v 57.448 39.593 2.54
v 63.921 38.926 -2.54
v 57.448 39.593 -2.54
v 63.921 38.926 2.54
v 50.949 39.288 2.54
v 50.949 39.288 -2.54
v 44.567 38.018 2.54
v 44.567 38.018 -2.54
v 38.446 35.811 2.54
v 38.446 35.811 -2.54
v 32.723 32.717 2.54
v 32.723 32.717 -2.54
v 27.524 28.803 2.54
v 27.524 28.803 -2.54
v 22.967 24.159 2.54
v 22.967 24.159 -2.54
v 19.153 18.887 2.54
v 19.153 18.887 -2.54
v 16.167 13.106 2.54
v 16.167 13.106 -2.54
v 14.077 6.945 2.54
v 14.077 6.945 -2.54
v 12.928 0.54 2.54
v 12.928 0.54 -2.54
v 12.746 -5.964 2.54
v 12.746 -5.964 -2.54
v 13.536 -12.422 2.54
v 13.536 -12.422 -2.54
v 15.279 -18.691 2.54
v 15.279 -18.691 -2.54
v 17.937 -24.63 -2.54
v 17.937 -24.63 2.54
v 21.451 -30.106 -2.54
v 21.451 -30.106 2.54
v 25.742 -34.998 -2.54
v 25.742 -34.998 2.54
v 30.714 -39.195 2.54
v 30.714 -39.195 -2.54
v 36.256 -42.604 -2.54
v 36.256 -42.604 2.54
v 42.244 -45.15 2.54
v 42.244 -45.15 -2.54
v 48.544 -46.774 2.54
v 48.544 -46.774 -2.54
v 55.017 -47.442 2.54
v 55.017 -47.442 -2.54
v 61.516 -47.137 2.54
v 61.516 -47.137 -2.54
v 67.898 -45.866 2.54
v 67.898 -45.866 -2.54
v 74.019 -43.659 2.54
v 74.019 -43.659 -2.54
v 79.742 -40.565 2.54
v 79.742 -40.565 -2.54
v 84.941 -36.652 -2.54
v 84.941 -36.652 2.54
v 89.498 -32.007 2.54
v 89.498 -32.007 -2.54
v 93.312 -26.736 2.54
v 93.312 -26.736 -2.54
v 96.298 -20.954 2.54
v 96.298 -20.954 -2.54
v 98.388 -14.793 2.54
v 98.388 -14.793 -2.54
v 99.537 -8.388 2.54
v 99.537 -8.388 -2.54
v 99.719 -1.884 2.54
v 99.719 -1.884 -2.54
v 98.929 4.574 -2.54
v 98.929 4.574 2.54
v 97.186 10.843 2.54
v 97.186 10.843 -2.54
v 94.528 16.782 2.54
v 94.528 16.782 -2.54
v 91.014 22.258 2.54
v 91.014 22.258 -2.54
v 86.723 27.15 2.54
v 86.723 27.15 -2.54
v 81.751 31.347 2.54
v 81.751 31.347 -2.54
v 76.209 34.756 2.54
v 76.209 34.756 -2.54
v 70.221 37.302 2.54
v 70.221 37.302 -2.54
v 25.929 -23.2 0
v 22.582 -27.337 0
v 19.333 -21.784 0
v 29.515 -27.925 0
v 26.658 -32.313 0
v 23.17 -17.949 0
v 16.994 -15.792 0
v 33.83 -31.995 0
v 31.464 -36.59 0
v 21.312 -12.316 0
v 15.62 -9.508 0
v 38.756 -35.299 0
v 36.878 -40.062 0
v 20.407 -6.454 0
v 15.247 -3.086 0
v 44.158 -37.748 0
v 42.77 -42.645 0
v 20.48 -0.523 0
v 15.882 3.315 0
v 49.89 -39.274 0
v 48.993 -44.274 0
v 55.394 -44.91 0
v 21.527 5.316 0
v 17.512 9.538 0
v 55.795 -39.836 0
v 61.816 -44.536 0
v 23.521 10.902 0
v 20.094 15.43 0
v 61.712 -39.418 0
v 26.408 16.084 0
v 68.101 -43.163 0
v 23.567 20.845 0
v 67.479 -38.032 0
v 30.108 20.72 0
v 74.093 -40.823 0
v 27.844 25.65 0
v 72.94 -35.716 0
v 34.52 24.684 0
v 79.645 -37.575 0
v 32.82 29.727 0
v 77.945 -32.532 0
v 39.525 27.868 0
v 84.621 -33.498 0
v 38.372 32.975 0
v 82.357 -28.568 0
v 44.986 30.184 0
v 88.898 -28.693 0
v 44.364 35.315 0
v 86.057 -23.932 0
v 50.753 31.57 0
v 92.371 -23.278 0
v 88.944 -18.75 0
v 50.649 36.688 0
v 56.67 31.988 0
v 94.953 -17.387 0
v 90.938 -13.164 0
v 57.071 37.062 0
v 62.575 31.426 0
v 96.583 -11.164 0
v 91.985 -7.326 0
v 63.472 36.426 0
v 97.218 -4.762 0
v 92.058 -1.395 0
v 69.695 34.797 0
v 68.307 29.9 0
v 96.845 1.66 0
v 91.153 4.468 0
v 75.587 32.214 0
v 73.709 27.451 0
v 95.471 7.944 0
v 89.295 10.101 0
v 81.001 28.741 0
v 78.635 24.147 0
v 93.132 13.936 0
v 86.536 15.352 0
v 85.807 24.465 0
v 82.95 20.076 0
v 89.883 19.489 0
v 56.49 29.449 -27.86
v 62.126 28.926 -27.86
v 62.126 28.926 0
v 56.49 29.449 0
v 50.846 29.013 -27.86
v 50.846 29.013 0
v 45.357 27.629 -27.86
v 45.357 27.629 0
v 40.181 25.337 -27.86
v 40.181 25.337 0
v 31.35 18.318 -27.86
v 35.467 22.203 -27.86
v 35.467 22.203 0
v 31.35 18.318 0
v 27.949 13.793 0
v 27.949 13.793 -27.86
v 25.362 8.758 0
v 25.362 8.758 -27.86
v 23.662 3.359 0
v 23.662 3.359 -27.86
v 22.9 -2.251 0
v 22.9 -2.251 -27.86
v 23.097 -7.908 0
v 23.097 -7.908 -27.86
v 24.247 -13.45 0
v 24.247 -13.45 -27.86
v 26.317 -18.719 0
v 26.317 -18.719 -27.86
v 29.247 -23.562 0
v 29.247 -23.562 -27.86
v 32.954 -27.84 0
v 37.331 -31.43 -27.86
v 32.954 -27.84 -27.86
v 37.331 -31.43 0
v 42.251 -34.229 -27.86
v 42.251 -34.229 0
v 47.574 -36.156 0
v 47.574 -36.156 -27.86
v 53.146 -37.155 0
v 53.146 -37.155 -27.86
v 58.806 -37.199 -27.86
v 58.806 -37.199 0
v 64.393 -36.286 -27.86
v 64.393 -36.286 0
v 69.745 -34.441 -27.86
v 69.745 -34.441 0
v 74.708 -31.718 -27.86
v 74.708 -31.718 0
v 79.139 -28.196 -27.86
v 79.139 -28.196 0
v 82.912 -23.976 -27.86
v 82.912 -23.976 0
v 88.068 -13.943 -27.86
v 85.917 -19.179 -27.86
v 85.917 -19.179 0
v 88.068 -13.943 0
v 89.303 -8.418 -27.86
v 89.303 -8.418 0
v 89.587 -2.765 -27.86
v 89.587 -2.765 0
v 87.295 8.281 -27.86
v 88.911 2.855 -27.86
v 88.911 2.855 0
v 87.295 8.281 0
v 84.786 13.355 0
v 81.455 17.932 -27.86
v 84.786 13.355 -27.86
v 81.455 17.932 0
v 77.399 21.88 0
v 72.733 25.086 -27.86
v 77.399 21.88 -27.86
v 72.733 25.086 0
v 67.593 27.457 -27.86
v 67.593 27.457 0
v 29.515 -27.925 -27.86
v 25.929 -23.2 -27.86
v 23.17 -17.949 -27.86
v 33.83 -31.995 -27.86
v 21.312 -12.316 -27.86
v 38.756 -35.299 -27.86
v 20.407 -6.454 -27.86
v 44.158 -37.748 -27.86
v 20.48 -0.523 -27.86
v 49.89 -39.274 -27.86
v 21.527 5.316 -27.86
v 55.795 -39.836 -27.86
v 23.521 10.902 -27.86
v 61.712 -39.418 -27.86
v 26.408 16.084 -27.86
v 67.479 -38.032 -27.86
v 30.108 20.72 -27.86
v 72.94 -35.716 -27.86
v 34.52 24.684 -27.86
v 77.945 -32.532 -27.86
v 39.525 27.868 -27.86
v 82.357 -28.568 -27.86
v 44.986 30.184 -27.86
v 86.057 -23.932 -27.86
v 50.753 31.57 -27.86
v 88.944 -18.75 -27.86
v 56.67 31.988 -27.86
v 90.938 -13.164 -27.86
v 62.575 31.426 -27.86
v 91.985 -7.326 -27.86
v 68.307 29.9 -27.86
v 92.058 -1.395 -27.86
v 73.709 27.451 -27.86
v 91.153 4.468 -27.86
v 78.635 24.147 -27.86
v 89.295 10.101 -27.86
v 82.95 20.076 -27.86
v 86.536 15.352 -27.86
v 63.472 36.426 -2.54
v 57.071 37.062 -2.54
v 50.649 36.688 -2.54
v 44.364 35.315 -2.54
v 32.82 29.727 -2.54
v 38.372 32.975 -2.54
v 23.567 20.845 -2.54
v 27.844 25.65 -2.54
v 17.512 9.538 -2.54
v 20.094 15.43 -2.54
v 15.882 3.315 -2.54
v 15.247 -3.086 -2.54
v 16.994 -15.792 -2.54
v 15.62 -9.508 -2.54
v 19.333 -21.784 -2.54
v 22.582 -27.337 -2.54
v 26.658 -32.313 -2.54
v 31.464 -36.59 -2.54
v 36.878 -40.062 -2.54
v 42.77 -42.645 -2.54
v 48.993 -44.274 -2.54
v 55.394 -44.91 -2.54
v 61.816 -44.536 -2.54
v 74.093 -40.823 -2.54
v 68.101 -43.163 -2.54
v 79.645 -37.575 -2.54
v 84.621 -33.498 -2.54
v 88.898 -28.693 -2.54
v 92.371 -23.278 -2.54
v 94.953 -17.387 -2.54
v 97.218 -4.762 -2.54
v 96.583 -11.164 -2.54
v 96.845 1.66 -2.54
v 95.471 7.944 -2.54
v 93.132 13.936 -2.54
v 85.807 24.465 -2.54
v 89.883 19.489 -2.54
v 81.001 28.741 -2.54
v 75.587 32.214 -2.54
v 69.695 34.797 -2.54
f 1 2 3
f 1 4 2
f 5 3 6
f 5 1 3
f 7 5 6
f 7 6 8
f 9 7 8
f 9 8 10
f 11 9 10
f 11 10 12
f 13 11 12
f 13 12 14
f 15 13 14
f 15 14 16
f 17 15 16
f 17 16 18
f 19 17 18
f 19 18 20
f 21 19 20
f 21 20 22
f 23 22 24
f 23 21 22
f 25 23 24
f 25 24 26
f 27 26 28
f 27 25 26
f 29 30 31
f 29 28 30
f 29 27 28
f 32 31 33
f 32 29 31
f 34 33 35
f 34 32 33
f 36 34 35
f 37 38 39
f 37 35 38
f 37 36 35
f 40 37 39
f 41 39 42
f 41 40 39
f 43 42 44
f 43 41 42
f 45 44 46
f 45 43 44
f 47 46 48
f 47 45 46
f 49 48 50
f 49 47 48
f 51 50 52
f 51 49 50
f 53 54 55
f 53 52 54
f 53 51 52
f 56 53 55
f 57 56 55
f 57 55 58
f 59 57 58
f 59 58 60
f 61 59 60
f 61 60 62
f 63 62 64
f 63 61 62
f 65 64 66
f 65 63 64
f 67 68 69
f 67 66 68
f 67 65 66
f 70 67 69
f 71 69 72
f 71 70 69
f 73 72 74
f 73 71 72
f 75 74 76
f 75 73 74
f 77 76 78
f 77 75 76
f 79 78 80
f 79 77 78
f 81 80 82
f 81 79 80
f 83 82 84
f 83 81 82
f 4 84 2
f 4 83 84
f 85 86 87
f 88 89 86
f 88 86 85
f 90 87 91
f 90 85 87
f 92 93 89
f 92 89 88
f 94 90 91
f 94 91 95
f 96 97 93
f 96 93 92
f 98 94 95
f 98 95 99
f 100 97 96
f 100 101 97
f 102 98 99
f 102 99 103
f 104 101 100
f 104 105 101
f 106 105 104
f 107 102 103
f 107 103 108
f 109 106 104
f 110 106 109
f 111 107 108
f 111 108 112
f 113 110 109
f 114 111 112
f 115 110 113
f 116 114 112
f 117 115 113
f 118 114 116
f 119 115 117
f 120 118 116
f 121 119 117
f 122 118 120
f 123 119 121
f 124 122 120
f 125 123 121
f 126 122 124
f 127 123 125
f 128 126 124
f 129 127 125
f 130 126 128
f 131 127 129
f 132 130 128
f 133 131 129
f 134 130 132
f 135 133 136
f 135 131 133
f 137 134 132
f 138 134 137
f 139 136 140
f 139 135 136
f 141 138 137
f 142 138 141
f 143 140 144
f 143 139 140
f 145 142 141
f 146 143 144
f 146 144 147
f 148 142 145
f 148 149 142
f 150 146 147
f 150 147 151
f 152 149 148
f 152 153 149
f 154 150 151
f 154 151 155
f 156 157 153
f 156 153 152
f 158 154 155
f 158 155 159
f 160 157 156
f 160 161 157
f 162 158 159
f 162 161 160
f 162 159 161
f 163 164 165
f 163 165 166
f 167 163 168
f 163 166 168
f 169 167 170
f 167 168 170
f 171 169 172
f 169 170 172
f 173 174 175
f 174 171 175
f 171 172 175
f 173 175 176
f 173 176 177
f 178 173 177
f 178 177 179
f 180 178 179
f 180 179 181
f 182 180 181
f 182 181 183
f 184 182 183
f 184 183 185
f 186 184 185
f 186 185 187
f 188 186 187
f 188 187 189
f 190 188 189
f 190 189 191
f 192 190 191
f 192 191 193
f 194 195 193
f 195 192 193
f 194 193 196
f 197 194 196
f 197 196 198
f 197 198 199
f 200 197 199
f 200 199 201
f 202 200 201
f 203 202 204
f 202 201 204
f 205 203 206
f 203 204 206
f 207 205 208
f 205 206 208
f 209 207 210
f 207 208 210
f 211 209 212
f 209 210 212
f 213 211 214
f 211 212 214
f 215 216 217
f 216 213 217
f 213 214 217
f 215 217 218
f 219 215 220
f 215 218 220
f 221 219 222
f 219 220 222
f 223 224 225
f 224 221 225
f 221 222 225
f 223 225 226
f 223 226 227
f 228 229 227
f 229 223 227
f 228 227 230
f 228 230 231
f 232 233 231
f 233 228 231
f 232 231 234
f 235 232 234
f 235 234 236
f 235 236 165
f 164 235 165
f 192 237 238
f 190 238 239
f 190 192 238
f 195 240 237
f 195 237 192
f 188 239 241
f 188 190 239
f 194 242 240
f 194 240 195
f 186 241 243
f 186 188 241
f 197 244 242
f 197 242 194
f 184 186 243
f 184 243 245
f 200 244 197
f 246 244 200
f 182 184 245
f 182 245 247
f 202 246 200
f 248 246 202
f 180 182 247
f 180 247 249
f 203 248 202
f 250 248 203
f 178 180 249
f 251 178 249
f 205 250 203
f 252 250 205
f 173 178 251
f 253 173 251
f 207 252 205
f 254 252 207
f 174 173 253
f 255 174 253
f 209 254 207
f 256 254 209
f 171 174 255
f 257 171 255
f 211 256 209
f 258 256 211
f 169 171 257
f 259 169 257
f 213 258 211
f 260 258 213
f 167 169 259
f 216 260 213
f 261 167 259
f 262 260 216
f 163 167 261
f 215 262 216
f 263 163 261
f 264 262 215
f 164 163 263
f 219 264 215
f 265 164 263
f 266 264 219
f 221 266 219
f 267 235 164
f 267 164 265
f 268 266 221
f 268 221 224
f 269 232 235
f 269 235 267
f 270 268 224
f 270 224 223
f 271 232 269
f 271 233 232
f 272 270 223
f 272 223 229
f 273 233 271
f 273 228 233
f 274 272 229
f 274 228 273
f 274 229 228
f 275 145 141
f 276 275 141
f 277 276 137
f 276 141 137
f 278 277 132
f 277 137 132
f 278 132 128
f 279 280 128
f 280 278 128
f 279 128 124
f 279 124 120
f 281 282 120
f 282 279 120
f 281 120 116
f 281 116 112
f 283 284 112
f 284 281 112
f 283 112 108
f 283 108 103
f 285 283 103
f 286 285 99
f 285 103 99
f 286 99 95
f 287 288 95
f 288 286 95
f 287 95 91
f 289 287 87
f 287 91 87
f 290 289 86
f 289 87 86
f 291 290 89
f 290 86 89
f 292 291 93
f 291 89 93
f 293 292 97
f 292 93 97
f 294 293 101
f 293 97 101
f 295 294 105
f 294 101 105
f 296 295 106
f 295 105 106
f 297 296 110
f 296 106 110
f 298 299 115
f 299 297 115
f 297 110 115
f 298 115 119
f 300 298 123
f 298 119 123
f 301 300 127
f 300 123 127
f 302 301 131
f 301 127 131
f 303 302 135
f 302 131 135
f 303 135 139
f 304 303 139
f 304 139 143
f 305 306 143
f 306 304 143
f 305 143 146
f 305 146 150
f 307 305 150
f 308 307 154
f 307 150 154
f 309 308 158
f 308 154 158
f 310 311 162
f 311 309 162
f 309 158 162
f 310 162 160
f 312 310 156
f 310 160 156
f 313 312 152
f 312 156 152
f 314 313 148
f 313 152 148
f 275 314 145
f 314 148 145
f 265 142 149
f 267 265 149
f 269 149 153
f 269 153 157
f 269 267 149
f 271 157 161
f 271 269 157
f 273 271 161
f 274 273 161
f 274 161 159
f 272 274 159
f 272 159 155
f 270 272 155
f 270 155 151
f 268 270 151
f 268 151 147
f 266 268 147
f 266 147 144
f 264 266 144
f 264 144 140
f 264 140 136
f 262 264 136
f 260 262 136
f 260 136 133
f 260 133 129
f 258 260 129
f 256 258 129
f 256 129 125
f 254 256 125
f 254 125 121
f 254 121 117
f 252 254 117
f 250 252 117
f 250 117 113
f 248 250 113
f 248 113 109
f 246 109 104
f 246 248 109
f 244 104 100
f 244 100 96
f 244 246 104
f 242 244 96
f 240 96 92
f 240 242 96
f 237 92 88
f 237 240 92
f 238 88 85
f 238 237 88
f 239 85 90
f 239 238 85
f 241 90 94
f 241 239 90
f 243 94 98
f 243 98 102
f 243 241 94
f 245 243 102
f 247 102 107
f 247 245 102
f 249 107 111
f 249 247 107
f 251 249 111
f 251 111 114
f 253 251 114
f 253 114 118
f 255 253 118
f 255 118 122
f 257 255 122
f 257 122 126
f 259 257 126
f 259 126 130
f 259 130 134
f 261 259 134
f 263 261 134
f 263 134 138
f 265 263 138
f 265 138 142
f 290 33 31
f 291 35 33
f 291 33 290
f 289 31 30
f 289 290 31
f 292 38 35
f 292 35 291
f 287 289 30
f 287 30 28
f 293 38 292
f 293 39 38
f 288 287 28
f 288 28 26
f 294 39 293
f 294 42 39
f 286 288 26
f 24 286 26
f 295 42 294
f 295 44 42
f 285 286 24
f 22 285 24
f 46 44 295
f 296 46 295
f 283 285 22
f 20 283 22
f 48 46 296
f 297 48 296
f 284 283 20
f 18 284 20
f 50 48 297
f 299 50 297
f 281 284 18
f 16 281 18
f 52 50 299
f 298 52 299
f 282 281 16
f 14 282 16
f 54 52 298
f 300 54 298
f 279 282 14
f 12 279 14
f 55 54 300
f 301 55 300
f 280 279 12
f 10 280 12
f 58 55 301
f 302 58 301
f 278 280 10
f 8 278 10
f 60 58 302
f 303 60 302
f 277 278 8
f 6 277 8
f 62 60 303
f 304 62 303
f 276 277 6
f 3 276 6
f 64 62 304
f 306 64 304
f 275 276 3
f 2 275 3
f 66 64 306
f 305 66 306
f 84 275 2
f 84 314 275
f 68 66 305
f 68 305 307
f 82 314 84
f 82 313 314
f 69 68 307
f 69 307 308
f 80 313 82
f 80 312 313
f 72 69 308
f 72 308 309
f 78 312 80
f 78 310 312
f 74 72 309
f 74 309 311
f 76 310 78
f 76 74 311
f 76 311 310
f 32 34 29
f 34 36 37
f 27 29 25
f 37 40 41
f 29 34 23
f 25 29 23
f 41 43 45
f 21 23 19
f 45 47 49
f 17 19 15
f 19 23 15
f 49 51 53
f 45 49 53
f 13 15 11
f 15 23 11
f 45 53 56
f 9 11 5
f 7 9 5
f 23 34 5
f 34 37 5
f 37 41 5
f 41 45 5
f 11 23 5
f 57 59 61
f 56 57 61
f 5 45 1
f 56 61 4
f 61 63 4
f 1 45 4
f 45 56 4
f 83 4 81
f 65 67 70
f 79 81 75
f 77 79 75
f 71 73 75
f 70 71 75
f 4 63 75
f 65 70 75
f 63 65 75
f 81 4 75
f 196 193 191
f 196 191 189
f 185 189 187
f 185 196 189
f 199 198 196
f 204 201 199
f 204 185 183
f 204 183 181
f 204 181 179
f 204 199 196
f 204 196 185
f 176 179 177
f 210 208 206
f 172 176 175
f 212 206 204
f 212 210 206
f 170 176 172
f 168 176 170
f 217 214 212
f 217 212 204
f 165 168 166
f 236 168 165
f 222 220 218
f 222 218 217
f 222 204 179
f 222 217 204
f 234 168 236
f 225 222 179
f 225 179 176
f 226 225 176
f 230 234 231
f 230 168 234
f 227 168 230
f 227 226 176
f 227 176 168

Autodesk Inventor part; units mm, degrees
ref_plane "YZ Plane" through (0, 0, 0) normal (1, 0, 0) x (0, 1, 0)
ref_plane "XZ Plane" through (0, 0, 0) normal (0, 1, 0) x (-1, 0, 0)
ref_plane "XY Plane" through (0, 0, 0) normal (0, 0, 1) x (1, 0, 0)
ref_plane "Work Plane1" through (56.2325, -3.9241, -54.643) normal (0.9843, -0.1766, 0) x (0.1766, 0.9843, 0)
sketch "Sketch1" plane through (56.2325, -3.9241, -54.643) normal (0.9843, -0.1766, 0) x (0.1766, 0.9843, 0)
  line L0 (8.8813, -28.7707) -> (8.8813, -26.2307) construction
  line L1 (8.8813, -26.2307) -> (11.7241, -26.2307) construction
  line L2 (11.7241, -26.2307) -> (11.7241, -28.7707) construction
  line L3 (11.7241, -28.7707) -> (8.8813, -28.7707) construction
  line L4 (4.5958, -26.2307) -> (4.5958, -28.7707) construction
  line L5 (4.5958, -28.7707) -> (-5.2462, -28.7707) construction
  line L6 (-5.2462, -28.7707) -> (-5.2462, -26.2307) construction
  line L7 (-5.2462, -26.2307) -> (4.5958, -26.2307) construction
  line L8 (19.4818, -26.2307) -> (19.4818, -28.7707) construction
  line L9 (19.4818, -28.7707) -> (16.7961, -28.7707) construction
  line L10 (16.7961, -28.7707) -> (16.7961, -26.2307) construction
  line L11 (16.7961, -26.2307) -> (19.4818, -26.2307) construction
  spline S0 degree 2 poles (40.7352, 49.563) (36.4181, 6.3217) (32.911, -28.7707) knots 0 0 0 7.872352 7.872352 7.872352 weights 1 1.005429 1 construction
  line L12 (32.911, -28.7707) -> (24.0815, -28.7707) construction
  line L13 (24.0815, -28.7707) -> (24.0815, -26.2307) construction
  line L14 (24.0815, -26.2307) -> (30.6156, -26.2307) construction
  spline S1 degree 2 poles (30.6156, -26.2307) (33.9974, 7.5872) (38.19, 49.563) knots 0 0 0 7.617126 7.617126 7.617126 weights 1 1.005811 1 construction
  line L15 (38.19, 49.563) -> (38.4437, 52.103) construction
  line L16 (38.4437, 52.103) -> (48.6252, 52.103) construction
  line L17 (48.6252, 52.103) -> (48.6252, 43.213) construction
  line L18 (48.6252, 43.213) -> (46.0815, 43.213) construction
  line L19 (46.0815, 43.213) -> (46.0815, 49.563) construction
  line L20 (46.0815, 49.563) -> (40.7352, 49.563) construction
  spline S2 degree 2 poles (-34.4769, -28.7707) (-37.984, 6.3217) (-42.3012, 49.563) knots 0 0 0 7.872352 7.872352 7.872352 weights 1 1.005429 1 construction
  line L21 (-42.3012, 49.563) -> (-47.6475, 49.563) construction
  line L22 (-47.6475, 49.563) -> (-47.6475, 43.213) construction
  line L23 (-47.6475, 43.213) -> (-50.1911, 43.213) construction
  line L24 (-50.1911, 43.213) -> (-50.1911, 52.103) construction
  line L25 (-50.1911, 52.103) -> (-40.0096, 52.103) construction
  line L26 (-40.0096, 52.103) -> (-39.7559, 49.563) construction
  spline S3 degree 2 poles (-39.7559, 49.563) (-35.5633, 7.5872) (-32.1815, -26.2307) knots 0 0 0 7.617126 7.617126 7.617126 weights 1 1.005811 1 construction
  line L27 (-32.1815, -26.2307) -> (-8.6835, -26.2307) construction
  line L28 (-8.6835, -26.2307) -> (-8.6835, -28.7707) construction
  line L29 (-8.6835, -28.7707) -> (-34.4769, -28.7707) construction
  line L30 (43.5344, 52.103) -> (43.5344, 57.183)
  line L31 (43.5344, 52.103) -> (40.9944, 52.103)
  line L32 (40.9944, 52.103) -> (40.9944, 54.643)
  line L33 (40.9944, 54.643) -> (35.9144, 54.643)
  line L34 (35.9144, 54.643) -> (35.9144, 26.7834)
  line L35 (35.9144, 26.7834) -> (33.3744, 26.7834)
  line L36 (33.3744, 26.7834) -> (33.3744, 54.643)
  line L37 (33.3744, 54.643) -> (0, 54.643)
  line L38 (0, 57.183) -> (43.5344, 57.183)
  line L39 (0, 57.183) -> (0, 54.643)
  point P0 (-6.0665, 54.643)
  dimension "d1" = 5.08
  dimension "d4" = 2.54
  dimension "d5" = 2.54
  dimension "d6" = 5.08
  dimension "d7" = 2.54
  dimension "d8" = 2.54
  dimension "d9" = 48.6252
revolve "Revolution1" add sketch "Sketch1" angle 360 about axis through (56.2325, -3.9241, 2.54) along (0, 0, -1)
properties part number "lid" material "Stainless Steel"
